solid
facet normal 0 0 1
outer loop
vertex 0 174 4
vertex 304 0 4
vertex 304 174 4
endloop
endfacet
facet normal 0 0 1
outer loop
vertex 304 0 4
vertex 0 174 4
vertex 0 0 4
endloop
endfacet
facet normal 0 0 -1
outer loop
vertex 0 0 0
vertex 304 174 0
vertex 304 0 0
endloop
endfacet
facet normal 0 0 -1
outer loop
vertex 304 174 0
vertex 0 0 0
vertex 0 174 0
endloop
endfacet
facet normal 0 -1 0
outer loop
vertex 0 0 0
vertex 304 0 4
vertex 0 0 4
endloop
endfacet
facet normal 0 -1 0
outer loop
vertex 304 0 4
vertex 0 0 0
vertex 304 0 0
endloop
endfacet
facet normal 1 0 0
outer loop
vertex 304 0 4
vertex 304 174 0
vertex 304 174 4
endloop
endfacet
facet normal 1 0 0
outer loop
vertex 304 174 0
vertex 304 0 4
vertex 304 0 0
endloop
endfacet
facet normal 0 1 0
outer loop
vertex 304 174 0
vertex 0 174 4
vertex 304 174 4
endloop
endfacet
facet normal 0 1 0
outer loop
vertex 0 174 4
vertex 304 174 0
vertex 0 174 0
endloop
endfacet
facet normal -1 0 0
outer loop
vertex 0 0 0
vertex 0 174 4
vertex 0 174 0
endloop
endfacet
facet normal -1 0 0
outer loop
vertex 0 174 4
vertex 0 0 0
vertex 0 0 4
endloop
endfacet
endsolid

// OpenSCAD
// Concept only. Provisional dimensions in mm.
$fn=32;
cube([304,174,4]);
